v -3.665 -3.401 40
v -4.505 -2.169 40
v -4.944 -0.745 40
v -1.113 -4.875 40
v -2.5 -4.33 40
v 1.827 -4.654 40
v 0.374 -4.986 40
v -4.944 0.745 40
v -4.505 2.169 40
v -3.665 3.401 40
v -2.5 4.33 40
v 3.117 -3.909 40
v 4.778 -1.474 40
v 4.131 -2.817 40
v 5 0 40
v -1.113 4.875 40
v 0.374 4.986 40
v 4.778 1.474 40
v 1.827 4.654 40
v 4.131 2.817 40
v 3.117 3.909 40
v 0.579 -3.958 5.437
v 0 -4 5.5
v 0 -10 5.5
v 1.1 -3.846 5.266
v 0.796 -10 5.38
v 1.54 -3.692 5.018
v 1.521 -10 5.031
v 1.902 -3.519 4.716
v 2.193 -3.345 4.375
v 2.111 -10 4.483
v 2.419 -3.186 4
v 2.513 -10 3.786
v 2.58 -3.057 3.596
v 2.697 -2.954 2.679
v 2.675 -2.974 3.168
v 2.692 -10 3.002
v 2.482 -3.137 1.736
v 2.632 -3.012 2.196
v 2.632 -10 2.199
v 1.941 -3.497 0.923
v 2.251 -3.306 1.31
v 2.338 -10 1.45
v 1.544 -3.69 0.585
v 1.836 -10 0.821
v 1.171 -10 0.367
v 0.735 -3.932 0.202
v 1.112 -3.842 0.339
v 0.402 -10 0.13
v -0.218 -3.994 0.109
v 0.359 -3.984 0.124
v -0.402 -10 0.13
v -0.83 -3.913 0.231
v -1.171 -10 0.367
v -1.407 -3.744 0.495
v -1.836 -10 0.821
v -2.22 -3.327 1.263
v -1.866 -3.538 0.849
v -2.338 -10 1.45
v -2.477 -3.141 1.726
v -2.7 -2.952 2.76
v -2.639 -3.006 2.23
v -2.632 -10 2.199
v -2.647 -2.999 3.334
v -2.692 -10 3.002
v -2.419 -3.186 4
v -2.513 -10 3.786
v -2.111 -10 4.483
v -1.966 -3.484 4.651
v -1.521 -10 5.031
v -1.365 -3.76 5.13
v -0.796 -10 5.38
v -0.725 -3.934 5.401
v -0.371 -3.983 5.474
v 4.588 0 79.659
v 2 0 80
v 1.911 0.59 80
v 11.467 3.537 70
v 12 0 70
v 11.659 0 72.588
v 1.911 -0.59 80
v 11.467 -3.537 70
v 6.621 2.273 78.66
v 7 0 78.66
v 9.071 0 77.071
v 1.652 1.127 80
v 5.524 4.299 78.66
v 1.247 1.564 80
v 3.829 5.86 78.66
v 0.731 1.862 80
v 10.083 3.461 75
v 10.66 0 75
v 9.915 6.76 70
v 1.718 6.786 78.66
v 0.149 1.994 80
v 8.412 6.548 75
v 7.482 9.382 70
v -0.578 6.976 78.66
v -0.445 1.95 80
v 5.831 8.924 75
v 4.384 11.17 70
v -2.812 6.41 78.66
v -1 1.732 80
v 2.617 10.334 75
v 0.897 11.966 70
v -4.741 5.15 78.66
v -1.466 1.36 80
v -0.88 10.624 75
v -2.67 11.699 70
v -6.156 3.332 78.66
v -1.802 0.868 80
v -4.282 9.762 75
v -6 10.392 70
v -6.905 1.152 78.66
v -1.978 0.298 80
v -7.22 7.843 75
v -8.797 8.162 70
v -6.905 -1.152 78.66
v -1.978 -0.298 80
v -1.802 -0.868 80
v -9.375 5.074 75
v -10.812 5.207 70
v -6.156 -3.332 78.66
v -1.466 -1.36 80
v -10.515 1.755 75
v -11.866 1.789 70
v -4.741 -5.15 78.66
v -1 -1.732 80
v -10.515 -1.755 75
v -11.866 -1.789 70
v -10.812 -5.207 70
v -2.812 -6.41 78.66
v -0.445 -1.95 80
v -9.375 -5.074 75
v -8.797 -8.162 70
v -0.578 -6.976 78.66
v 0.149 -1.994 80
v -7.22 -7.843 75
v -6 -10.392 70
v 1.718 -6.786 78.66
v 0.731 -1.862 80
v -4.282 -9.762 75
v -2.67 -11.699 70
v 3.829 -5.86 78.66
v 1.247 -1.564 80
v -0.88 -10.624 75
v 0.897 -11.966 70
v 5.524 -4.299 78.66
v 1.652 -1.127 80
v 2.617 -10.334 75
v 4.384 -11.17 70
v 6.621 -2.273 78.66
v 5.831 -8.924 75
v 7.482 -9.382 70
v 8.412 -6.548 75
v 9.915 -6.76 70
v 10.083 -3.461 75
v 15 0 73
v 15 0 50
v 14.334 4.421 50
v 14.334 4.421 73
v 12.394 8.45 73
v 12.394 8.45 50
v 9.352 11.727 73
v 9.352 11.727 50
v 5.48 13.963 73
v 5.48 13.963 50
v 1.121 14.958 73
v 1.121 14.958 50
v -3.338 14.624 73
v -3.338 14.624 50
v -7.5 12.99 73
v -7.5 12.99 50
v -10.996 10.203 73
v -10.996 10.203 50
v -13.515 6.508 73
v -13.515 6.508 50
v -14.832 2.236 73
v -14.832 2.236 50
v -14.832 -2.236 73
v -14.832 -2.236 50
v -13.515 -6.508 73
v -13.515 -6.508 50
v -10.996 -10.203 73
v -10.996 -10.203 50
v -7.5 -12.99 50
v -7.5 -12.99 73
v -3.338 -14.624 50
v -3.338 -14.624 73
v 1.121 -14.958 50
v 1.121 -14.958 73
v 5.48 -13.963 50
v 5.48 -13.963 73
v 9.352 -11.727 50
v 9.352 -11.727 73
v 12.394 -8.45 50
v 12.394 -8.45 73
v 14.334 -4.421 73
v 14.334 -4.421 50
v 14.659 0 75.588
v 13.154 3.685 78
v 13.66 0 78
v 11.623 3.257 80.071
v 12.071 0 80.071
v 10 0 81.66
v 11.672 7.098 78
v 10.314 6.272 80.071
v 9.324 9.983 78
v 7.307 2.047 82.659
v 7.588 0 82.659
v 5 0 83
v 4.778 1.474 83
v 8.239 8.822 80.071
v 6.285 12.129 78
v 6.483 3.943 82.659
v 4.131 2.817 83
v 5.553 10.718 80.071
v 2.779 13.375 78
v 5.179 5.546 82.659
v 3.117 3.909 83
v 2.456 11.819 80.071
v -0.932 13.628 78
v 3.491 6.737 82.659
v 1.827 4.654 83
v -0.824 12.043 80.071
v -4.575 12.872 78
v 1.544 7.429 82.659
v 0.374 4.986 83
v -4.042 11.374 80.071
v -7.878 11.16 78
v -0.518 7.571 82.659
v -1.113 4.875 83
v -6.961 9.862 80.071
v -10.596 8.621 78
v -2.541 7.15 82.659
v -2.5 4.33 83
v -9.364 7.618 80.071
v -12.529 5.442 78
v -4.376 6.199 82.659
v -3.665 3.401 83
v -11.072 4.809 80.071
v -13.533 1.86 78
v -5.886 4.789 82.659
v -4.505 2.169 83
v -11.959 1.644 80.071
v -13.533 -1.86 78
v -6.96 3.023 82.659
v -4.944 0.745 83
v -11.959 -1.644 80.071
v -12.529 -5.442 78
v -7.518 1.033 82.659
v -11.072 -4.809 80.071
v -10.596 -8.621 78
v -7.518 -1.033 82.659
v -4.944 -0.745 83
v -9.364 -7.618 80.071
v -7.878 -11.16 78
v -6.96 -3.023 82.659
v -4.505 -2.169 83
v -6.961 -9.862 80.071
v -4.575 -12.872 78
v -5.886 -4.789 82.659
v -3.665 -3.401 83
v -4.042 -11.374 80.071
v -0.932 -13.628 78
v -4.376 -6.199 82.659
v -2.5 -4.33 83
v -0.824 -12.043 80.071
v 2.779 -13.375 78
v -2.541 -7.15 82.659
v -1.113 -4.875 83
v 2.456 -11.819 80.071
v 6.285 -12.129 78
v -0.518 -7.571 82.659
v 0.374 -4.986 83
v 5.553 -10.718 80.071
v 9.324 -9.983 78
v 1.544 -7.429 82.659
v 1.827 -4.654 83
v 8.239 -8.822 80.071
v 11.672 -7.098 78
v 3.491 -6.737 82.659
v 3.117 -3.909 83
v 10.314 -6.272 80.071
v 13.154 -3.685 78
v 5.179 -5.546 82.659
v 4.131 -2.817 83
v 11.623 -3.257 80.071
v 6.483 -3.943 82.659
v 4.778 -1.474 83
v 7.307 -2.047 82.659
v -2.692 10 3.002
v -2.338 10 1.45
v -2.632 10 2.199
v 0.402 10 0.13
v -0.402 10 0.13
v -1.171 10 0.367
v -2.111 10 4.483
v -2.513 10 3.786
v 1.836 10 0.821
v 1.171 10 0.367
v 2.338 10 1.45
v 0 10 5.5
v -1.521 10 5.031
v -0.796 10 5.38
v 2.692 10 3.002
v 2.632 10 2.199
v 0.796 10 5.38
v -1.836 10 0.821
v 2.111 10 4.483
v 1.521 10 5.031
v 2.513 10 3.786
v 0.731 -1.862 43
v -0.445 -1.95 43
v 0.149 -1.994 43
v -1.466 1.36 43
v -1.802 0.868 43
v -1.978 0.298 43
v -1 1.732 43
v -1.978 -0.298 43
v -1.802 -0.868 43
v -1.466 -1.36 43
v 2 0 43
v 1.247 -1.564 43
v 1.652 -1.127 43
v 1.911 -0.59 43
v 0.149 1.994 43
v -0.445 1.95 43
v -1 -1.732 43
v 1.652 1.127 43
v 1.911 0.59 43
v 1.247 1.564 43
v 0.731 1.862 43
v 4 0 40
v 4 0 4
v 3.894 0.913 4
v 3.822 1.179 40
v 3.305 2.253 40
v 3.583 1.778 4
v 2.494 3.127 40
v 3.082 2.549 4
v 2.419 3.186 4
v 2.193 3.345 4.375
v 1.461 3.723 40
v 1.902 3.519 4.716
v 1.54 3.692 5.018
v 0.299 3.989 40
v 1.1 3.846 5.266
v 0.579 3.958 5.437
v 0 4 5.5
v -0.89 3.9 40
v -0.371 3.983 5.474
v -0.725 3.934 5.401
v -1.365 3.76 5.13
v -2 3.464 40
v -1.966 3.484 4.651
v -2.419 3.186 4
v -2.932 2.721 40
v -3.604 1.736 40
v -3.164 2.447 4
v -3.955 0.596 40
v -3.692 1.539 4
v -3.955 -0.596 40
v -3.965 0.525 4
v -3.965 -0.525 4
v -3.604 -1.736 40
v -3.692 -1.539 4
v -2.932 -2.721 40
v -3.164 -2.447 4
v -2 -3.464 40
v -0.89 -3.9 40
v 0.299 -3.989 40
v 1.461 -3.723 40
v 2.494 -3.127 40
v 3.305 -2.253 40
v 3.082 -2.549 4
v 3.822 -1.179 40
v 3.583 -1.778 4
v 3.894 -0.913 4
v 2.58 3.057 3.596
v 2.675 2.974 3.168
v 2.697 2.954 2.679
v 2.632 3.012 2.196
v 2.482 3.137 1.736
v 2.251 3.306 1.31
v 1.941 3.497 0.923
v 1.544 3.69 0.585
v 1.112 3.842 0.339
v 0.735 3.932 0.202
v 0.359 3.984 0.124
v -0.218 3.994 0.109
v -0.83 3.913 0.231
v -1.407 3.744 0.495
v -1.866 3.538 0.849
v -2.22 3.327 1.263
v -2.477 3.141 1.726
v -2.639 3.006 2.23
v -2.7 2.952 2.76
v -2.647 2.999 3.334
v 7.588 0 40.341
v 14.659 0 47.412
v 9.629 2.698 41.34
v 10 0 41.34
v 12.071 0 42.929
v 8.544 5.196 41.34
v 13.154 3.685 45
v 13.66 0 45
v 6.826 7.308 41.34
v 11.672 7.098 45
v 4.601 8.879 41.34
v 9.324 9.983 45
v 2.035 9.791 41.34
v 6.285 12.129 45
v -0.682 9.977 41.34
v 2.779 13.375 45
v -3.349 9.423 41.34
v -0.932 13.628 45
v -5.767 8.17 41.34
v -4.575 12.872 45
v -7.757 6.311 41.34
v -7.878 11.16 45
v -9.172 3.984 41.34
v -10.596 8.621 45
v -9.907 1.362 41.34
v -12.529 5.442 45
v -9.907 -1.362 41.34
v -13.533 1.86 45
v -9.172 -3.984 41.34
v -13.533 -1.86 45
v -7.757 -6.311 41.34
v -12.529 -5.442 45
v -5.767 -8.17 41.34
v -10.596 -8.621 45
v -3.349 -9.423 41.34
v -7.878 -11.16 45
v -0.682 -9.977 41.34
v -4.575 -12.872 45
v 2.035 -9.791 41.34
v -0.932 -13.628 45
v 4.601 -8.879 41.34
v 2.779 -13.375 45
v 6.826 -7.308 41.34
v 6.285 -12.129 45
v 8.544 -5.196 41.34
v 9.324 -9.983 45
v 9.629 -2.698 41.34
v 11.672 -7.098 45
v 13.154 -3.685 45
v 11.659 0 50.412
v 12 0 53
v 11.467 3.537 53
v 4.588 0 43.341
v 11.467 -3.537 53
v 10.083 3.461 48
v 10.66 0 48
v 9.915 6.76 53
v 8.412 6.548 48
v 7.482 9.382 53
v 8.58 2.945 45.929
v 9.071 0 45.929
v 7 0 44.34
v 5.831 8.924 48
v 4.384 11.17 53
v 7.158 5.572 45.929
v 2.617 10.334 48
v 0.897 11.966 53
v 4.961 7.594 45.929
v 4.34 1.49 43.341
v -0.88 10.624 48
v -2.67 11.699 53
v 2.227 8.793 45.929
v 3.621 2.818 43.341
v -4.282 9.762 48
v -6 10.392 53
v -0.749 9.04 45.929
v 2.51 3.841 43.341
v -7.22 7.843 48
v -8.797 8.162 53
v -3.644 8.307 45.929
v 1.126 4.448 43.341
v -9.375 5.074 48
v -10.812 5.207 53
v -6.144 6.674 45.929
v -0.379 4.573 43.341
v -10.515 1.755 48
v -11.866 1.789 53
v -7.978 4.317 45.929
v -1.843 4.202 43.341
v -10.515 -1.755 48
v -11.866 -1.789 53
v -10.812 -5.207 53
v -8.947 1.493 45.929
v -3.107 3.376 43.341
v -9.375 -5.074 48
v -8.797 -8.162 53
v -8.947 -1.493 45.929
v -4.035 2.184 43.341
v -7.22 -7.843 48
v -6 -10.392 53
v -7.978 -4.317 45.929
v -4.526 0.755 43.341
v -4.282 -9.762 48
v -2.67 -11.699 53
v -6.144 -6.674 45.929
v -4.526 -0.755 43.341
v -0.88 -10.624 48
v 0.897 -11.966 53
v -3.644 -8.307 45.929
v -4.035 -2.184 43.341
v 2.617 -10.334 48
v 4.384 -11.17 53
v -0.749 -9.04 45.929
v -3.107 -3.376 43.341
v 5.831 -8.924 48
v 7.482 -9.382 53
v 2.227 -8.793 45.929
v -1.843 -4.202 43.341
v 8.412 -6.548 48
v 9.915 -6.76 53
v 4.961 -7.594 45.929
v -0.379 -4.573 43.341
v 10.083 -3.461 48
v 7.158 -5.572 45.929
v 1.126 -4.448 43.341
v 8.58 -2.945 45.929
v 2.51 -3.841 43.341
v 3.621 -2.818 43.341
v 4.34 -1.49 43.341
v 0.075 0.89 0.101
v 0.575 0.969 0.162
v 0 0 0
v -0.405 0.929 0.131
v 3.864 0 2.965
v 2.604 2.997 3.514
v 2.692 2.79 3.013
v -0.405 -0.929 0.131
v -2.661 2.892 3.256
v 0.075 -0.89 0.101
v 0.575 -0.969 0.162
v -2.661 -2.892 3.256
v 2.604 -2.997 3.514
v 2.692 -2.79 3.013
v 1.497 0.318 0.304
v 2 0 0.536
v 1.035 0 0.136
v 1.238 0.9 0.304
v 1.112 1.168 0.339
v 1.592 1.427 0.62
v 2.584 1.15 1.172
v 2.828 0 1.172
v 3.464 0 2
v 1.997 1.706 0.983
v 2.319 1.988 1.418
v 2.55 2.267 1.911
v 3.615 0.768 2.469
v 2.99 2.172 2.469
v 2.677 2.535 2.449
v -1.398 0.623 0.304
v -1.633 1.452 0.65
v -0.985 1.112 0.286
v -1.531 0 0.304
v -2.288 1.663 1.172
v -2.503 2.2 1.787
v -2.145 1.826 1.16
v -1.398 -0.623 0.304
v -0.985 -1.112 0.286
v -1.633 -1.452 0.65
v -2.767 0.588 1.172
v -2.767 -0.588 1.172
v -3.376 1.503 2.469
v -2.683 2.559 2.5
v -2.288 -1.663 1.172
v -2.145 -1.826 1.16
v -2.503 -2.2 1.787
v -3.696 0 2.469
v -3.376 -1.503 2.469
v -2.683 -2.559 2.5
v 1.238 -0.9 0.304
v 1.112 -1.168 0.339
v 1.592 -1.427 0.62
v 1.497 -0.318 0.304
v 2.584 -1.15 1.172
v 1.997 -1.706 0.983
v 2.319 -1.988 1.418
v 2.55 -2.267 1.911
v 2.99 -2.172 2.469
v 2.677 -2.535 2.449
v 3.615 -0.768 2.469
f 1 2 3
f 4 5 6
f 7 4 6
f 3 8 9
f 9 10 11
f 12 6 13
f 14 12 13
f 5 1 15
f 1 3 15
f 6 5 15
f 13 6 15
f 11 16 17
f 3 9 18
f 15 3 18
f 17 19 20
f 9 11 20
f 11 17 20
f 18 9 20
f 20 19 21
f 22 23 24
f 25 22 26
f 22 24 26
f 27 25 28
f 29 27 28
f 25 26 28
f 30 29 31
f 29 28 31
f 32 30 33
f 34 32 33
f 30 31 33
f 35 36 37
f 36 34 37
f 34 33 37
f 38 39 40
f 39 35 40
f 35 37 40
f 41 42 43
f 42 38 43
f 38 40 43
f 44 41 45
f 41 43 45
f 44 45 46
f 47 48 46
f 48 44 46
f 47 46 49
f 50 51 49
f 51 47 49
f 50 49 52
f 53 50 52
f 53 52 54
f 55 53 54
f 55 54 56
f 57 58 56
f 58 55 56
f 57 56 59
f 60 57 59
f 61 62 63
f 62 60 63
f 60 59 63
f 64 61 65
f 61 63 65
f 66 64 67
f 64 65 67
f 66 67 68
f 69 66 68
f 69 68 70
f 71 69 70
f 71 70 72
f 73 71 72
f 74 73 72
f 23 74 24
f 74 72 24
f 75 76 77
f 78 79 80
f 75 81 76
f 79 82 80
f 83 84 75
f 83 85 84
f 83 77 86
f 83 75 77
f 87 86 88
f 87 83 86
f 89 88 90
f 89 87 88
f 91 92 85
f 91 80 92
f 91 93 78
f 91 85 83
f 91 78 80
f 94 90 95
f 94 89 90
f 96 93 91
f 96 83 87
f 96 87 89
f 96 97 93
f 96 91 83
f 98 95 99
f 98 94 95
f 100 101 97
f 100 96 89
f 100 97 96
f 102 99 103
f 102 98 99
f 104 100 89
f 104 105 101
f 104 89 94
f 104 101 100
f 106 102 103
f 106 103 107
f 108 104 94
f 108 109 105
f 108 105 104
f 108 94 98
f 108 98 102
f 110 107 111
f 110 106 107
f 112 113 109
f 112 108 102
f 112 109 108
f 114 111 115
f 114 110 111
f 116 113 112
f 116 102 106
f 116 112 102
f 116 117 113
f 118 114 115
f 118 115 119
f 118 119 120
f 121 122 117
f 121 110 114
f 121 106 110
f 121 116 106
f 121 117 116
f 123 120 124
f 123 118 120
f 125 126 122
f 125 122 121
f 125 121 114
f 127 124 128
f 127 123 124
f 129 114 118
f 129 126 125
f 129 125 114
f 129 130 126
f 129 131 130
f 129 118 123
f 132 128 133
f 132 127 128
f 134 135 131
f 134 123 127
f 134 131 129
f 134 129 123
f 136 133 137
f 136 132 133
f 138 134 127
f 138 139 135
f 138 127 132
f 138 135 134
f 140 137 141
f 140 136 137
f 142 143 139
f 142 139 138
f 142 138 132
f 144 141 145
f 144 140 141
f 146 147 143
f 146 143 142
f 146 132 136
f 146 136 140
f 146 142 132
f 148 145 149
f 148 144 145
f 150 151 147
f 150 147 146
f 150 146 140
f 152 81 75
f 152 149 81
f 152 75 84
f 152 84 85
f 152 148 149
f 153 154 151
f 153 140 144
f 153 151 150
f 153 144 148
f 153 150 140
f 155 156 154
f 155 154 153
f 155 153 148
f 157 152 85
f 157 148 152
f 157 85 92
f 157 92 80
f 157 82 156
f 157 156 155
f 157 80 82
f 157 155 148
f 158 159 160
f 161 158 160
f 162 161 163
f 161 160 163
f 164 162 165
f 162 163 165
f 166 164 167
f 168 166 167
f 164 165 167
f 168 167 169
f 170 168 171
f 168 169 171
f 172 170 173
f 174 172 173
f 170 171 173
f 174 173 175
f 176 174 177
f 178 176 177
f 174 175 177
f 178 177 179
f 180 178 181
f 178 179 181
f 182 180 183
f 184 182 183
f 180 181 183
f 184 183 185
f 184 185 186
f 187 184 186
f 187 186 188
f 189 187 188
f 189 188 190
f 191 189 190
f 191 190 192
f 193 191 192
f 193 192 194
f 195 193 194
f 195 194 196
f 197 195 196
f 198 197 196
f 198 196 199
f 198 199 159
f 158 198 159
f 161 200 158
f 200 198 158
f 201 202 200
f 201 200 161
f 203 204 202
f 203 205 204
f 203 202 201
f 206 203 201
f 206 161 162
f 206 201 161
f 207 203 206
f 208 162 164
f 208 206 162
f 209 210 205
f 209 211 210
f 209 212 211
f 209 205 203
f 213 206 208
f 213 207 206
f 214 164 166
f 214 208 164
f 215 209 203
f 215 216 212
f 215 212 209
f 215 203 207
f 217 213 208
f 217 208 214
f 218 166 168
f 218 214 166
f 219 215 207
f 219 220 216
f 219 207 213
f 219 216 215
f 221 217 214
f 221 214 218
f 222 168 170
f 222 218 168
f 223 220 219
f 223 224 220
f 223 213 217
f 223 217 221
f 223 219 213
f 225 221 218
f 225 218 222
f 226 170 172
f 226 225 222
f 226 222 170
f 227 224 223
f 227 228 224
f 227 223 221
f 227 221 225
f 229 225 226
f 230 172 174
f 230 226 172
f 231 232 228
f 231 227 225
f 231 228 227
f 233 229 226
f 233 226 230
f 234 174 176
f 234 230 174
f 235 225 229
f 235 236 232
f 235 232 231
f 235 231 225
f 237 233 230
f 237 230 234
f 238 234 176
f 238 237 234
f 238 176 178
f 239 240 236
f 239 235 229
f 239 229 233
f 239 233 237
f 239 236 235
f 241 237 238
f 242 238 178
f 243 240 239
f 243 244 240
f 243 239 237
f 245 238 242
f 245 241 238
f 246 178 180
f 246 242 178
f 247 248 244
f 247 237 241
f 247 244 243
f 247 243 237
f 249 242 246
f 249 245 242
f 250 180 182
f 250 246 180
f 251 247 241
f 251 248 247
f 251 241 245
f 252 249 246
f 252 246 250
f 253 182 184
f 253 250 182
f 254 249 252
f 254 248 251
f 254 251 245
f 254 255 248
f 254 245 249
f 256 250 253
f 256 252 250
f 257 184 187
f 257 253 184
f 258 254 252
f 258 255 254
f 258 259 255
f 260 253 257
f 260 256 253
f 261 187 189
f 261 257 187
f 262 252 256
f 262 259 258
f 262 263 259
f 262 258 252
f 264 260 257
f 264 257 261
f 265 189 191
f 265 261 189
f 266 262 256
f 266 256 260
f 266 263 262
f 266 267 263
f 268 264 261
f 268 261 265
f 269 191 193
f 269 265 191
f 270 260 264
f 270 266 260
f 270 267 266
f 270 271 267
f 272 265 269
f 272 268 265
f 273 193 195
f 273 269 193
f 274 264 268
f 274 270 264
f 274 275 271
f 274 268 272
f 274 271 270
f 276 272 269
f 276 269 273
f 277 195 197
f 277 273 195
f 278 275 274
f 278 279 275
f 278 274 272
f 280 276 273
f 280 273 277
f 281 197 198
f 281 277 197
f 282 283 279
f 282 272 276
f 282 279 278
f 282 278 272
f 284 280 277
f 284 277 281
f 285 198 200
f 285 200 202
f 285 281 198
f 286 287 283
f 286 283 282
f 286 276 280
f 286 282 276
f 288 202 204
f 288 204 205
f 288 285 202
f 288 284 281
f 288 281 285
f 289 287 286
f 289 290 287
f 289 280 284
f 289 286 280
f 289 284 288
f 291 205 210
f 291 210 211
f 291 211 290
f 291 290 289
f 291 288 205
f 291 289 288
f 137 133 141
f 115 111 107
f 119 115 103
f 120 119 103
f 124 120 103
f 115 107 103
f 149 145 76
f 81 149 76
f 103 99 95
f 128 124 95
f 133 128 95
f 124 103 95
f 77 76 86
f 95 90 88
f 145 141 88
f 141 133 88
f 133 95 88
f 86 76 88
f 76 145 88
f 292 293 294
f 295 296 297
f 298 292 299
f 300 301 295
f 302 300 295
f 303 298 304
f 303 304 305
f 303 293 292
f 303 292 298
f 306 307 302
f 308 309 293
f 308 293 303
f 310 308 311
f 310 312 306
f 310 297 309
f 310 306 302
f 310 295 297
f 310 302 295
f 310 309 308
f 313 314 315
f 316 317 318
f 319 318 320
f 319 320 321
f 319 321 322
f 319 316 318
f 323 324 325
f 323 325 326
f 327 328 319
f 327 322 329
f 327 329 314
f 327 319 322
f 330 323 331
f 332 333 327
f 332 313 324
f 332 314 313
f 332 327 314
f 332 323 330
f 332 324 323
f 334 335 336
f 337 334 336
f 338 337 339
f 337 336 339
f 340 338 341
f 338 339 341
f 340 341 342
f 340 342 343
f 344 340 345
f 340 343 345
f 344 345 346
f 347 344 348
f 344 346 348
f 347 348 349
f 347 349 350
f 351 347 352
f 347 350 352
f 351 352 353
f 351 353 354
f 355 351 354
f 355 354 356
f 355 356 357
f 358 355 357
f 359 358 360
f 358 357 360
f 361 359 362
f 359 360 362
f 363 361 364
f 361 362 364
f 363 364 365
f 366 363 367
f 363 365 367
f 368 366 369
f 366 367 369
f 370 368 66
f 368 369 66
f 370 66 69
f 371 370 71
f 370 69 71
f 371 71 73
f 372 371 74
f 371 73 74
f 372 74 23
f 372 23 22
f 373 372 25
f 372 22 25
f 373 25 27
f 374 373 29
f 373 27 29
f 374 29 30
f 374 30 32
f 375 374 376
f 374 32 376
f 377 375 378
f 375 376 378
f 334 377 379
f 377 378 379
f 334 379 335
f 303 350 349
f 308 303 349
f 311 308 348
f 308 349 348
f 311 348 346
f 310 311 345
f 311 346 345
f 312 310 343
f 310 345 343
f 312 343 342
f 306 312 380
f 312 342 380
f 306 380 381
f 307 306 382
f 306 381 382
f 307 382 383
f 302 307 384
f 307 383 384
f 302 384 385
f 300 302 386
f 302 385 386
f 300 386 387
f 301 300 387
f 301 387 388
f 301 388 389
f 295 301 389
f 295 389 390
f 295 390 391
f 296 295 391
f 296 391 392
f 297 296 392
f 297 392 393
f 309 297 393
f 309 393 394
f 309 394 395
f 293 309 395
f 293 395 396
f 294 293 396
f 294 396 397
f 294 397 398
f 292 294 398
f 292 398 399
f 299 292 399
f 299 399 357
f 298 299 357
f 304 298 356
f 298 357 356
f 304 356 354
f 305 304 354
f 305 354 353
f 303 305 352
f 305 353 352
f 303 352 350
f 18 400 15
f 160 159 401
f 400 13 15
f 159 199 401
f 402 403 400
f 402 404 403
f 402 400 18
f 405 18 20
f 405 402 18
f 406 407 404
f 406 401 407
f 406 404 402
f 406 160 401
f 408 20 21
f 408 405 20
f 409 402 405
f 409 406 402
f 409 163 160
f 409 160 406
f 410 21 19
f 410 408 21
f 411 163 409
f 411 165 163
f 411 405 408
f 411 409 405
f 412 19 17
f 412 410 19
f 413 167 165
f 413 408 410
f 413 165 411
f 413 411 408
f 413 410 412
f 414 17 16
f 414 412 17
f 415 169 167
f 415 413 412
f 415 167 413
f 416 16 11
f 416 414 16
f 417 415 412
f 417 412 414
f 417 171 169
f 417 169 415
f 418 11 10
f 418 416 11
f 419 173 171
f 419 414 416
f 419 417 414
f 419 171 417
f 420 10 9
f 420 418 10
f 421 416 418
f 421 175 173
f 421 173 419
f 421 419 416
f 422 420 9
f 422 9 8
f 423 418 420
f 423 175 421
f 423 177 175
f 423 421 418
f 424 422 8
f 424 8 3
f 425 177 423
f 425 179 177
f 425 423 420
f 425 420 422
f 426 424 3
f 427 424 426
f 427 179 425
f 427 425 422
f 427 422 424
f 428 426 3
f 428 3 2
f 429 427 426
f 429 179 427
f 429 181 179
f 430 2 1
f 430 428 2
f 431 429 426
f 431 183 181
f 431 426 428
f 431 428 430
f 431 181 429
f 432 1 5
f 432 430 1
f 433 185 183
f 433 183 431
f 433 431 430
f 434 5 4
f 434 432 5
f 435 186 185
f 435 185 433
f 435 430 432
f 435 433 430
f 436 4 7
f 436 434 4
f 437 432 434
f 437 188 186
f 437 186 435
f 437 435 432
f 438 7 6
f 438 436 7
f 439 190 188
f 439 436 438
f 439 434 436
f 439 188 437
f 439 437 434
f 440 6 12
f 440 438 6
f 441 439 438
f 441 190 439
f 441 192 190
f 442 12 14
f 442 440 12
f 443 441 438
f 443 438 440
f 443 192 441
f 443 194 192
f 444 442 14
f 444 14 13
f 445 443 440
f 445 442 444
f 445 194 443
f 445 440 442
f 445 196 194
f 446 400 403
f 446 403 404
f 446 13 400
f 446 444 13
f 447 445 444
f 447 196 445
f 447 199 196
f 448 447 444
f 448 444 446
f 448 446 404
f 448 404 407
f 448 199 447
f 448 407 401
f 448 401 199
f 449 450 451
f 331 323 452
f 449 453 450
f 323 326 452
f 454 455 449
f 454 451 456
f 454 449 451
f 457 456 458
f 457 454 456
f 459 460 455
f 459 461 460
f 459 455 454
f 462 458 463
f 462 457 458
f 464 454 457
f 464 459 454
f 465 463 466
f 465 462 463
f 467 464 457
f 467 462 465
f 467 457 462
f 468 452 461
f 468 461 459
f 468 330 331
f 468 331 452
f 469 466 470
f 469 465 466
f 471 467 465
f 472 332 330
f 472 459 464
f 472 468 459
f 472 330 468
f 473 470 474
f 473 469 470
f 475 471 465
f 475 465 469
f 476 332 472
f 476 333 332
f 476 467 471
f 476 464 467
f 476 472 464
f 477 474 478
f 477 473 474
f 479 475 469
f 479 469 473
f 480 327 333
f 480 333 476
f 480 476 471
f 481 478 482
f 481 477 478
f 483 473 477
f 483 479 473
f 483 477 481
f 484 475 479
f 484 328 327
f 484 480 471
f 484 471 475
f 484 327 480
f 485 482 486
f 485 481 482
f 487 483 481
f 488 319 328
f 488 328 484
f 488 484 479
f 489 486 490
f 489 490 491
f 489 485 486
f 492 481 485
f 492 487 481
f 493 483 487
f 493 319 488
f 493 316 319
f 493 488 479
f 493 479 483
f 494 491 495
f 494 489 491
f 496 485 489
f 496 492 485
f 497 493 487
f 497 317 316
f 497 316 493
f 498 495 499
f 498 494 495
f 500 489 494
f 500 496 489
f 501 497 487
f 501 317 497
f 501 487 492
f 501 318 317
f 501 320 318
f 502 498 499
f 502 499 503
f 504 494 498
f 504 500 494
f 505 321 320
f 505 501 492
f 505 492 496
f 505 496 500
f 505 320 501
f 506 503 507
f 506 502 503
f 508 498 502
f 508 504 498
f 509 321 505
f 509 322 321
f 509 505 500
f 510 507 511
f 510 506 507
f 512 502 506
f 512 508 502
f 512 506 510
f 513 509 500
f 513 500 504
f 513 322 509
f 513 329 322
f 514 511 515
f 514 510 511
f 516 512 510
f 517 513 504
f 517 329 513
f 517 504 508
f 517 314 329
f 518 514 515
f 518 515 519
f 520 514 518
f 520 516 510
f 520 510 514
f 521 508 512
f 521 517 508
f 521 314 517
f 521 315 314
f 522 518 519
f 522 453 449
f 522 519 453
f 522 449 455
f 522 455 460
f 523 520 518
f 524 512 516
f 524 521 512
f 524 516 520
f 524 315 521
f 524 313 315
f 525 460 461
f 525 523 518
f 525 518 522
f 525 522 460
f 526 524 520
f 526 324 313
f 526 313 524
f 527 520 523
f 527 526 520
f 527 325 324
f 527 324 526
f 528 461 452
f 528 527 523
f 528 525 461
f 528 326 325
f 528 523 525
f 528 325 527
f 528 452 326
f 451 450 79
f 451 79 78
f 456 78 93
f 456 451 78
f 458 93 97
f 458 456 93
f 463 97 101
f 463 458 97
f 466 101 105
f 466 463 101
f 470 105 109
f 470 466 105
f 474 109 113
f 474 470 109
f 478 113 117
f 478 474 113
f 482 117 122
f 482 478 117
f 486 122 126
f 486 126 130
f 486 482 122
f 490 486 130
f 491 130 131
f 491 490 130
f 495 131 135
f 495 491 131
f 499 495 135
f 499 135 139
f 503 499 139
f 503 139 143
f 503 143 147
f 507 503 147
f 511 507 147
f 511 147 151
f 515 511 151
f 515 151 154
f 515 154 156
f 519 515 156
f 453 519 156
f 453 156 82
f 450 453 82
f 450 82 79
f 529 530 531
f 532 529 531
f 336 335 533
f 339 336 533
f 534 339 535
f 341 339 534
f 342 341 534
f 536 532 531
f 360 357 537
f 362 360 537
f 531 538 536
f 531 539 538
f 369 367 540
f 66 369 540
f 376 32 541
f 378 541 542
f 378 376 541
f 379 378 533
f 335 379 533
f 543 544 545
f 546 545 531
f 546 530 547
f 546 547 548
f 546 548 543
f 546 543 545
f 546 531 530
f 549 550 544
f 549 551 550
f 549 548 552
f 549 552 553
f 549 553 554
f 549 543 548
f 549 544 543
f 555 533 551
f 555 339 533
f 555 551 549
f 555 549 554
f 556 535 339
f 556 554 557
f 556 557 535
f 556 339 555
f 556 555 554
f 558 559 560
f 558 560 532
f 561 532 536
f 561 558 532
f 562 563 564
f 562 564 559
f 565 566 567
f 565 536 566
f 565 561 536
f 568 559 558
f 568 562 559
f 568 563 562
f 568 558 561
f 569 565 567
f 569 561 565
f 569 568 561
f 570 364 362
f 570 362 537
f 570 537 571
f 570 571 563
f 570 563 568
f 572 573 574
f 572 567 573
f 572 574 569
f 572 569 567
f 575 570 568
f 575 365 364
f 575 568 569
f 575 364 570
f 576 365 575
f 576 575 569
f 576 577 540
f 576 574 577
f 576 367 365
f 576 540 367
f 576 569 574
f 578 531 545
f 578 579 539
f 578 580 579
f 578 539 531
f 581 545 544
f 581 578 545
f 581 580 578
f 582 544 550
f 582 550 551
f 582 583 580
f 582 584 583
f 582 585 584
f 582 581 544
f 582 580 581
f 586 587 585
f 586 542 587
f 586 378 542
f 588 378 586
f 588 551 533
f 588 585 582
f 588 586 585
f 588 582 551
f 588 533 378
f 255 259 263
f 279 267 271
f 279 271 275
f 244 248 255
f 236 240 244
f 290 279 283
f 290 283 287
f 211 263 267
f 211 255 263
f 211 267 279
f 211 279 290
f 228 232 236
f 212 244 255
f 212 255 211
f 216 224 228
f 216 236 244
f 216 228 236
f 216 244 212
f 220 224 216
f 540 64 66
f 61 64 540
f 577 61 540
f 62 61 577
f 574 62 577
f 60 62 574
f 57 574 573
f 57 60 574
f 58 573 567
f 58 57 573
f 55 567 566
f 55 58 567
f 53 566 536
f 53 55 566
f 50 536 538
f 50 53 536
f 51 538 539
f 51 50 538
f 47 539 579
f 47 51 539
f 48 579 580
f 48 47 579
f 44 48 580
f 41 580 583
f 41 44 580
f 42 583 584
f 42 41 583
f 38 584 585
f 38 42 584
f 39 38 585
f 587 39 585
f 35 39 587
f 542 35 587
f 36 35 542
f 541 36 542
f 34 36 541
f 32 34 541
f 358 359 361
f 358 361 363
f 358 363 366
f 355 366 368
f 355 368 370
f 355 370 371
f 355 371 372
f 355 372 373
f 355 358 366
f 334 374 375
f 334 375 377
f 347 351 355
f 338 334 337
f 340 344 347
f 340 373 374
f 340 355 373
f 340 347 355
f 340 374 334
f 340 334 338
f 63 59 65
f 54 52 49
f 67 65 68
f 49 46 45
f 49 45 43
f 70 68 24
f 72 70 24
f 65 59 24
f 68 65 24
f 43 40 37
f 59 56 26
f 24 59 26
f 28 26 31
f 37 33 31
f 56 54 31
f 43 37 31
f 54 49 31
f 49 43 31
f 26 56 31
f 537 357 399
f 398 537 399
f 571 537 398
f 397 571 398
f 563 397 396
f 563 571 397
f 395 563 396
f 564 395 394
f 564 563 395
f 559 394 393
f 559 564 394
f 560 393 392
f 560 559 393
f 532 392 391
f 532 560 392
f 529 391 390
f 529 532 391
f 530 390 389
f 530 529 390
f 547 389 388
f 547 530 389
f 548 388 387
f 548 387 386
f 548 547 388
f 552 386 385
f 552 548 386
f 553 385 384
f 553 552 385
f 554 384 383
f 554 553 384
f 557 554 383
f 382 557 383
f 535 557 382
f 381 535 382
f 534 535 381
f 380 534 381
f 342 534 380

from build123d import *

# Parameters (mm, degrees)
SKETCH1_R                = 4
BOSS_EXTRUDE1_DEPTH      = 40
BOSS_EXTRUDE2_START      = 40
SKETCH1_3_R              = 15
SKETCH1_3_R_2            = 12
BOSS_EXTRUDE2_DEPTH      = 40
BOSS_EXTRUDE3_START      = 40
SKETCH1_4_R              = 12
SKETCH1_4_R_2            = 4
BOSS_EXTRUDE3_DEPTH      = 3
FILLET1_R                = 10
FILLET2_R                = 10
BOSS_EXTRUDE4_START      = 80
SKETCH1_5_R              = 15
SKETCH1_5_R_2            = 12
SKETCH1_5_R_3            = 4
BOSS_EXTRUDE4_DEPTH      = 3
FILLET5_R                = 10
FILLET6_R                = 10
BOSS_EXTRUDE5_DEPTH      = 10
BOSS_EXTRUDE5_DEPTH_BACK = 10
SKETCH2_R                = 2.7
FILLET7_R                = 4


with BuildPart() as part:
    # Sketch1 → Boss-Extrude1 (new body)
    with BuildSketch(Plane.XY):
        Circle(SKETCH1_R)
    extrude(amount=BOSS_EXTRUDE1_DEPTH)

    # Sketch2 → Boss-Extrude5 (add, two sides: drawn at the far end of the back side and taken through both)
    with BuildSketch(Plane(origin=(0, 0, 0), x_dir=(1, 0, 0), z_dir=(0, 1, 0)).offset(-BOSS_EXTRUDE5_DEPTH_BACK)):
        with Locations(Location((0, -2.8, 0), (0, 0, 270))):
            Circle(SKETCH2_R)
    extrude(amount=BOSS_EXTRUDE5_DEPTH + BOSS_EXTRUDE5_DEPTH_BACK)

    # Fillet7
    # the kernel refuses this fillet: 4 mm, written as the material it takes off along each edge
    with BuildSketch(Plane(origin=(0, 0, 0), x_dir=(1, 0, 0), z_dir=(0, -1, 0))) as fillet7_piece_1_section:
        with BuildLine():
            CenterArc((4 - FILLET7_R, FILLET7_R), FILLET7_R, 270, 90)
            Line((4 - FILLET7_R, 0), (4, 0))
            Line((4, 0), (4, FILLET7_R))
        make_face()
    fillet7_piece_1 = revolve(axis=Axis((0, 0, 0), (0, 0, 1)), mode=Mode.PRIVATE)
    fillet7_piece_1 = fillet7_piece_1 - Plane(origin=(0, 0, 2.8), x_dir=(0, 0, 1), z_dir=(0, -1, 0)) * Cylinder(2.7, 16, mode=Mode.PRIVATE)
    add(fillet7_piece_1, mode=Mode.SUBTRACT)


with BuildPart() as body_2:
    # Sketch1<3> → Boss-Extrude2 (new body)
    with BuildSketch(Plane.XY.offset(BOSS_EXTRUDE2_START)):
        Circle(SKETCH1_3_R)
        Circle(SKETCH1_3_R_2, mode=Mode.SUBTRACT)
    extrude(amount=BOSS_EXTRUDE2_DEPTH)

    # Sketch1<4> → Boss-Extrude3 (add)
    # profile 1 of 2: a face of its own
    with BuildSketch(Plane.XY.offset(BOSS_EXTRUDE3_START)):
        Circle(SKETCH1_4_R)
        Circle(SKETCH1_4_R_2, mode=Mode.SUBTRACT)
    # profile 2 of 2: a face of its own
    with BuildSketch(Plane.XY.offset(BOSS_EXTRUDE3_START)):
        Circle(SKETCH1_4_R_2)
    extrude(amount=BOSS_EXTRUDE3_DEPTH)

    # Fillet1
    fillet1_edges = [body_2.edges().sort_by_distance(p)[0] for p in [
        (-15, 0, 40),
    ]]
    fillet(fillet1_edges, radius=FILLET1_R)

    # Fillet2
    fillet2_edges = [body_2.edges().sort_by_distance(p)[0] for p in [
        (-12, 0, 43),
    ]]
    fillet(fillet2_edges, radius=FILLET2_R)

    # Sketch1<5> → Boss-Extrude4 (add)
    # profile 1 of 3: a face of its own
    with BuildSketch(Plane.XY.offset(BOSS_EXTRUDE4_START)):
        Circle(SKETCH1_5_R)
        Circle(SKETCH1_5_R_2, mode=Mode.SUBTRACT)
    # profile 2 of 3: a face of its own
    with BuildSketch(Plane.XY.offset(BOSS_EXTRUDE4_START)):
        Circle(SKETCH1_5_R_2)
        Circle(SKETCH1_5_R_3, mode=Mode.SUBTRACT)
    # profile 3 of 3: a face of its own
    with BuildSketch(Plane.XY.offset(BOSS_EXTRUDE4_START)):
        Circle(SKETCH1_5_R_3)
    extrude(amount=BOSS_EXTRUDE4_DEPTH)

    # Fillet5
    fillet5_edges = [body_2.edges().sort_by_distance(p)[0] for p in [
        (-12, 0, 80),
    ]]
    fillet(fillet5_edges, radius=FILLET5_R)

    # Fillet6
    fillet6_edges = [body_2.edges().sort_by_distance(p)[0] for p in [
        (-15, 0, 83),
    ]]
    fillet(fillet6_edges, radius=FILLET6_R)


solid = Compound([part.part, body_2.part])
